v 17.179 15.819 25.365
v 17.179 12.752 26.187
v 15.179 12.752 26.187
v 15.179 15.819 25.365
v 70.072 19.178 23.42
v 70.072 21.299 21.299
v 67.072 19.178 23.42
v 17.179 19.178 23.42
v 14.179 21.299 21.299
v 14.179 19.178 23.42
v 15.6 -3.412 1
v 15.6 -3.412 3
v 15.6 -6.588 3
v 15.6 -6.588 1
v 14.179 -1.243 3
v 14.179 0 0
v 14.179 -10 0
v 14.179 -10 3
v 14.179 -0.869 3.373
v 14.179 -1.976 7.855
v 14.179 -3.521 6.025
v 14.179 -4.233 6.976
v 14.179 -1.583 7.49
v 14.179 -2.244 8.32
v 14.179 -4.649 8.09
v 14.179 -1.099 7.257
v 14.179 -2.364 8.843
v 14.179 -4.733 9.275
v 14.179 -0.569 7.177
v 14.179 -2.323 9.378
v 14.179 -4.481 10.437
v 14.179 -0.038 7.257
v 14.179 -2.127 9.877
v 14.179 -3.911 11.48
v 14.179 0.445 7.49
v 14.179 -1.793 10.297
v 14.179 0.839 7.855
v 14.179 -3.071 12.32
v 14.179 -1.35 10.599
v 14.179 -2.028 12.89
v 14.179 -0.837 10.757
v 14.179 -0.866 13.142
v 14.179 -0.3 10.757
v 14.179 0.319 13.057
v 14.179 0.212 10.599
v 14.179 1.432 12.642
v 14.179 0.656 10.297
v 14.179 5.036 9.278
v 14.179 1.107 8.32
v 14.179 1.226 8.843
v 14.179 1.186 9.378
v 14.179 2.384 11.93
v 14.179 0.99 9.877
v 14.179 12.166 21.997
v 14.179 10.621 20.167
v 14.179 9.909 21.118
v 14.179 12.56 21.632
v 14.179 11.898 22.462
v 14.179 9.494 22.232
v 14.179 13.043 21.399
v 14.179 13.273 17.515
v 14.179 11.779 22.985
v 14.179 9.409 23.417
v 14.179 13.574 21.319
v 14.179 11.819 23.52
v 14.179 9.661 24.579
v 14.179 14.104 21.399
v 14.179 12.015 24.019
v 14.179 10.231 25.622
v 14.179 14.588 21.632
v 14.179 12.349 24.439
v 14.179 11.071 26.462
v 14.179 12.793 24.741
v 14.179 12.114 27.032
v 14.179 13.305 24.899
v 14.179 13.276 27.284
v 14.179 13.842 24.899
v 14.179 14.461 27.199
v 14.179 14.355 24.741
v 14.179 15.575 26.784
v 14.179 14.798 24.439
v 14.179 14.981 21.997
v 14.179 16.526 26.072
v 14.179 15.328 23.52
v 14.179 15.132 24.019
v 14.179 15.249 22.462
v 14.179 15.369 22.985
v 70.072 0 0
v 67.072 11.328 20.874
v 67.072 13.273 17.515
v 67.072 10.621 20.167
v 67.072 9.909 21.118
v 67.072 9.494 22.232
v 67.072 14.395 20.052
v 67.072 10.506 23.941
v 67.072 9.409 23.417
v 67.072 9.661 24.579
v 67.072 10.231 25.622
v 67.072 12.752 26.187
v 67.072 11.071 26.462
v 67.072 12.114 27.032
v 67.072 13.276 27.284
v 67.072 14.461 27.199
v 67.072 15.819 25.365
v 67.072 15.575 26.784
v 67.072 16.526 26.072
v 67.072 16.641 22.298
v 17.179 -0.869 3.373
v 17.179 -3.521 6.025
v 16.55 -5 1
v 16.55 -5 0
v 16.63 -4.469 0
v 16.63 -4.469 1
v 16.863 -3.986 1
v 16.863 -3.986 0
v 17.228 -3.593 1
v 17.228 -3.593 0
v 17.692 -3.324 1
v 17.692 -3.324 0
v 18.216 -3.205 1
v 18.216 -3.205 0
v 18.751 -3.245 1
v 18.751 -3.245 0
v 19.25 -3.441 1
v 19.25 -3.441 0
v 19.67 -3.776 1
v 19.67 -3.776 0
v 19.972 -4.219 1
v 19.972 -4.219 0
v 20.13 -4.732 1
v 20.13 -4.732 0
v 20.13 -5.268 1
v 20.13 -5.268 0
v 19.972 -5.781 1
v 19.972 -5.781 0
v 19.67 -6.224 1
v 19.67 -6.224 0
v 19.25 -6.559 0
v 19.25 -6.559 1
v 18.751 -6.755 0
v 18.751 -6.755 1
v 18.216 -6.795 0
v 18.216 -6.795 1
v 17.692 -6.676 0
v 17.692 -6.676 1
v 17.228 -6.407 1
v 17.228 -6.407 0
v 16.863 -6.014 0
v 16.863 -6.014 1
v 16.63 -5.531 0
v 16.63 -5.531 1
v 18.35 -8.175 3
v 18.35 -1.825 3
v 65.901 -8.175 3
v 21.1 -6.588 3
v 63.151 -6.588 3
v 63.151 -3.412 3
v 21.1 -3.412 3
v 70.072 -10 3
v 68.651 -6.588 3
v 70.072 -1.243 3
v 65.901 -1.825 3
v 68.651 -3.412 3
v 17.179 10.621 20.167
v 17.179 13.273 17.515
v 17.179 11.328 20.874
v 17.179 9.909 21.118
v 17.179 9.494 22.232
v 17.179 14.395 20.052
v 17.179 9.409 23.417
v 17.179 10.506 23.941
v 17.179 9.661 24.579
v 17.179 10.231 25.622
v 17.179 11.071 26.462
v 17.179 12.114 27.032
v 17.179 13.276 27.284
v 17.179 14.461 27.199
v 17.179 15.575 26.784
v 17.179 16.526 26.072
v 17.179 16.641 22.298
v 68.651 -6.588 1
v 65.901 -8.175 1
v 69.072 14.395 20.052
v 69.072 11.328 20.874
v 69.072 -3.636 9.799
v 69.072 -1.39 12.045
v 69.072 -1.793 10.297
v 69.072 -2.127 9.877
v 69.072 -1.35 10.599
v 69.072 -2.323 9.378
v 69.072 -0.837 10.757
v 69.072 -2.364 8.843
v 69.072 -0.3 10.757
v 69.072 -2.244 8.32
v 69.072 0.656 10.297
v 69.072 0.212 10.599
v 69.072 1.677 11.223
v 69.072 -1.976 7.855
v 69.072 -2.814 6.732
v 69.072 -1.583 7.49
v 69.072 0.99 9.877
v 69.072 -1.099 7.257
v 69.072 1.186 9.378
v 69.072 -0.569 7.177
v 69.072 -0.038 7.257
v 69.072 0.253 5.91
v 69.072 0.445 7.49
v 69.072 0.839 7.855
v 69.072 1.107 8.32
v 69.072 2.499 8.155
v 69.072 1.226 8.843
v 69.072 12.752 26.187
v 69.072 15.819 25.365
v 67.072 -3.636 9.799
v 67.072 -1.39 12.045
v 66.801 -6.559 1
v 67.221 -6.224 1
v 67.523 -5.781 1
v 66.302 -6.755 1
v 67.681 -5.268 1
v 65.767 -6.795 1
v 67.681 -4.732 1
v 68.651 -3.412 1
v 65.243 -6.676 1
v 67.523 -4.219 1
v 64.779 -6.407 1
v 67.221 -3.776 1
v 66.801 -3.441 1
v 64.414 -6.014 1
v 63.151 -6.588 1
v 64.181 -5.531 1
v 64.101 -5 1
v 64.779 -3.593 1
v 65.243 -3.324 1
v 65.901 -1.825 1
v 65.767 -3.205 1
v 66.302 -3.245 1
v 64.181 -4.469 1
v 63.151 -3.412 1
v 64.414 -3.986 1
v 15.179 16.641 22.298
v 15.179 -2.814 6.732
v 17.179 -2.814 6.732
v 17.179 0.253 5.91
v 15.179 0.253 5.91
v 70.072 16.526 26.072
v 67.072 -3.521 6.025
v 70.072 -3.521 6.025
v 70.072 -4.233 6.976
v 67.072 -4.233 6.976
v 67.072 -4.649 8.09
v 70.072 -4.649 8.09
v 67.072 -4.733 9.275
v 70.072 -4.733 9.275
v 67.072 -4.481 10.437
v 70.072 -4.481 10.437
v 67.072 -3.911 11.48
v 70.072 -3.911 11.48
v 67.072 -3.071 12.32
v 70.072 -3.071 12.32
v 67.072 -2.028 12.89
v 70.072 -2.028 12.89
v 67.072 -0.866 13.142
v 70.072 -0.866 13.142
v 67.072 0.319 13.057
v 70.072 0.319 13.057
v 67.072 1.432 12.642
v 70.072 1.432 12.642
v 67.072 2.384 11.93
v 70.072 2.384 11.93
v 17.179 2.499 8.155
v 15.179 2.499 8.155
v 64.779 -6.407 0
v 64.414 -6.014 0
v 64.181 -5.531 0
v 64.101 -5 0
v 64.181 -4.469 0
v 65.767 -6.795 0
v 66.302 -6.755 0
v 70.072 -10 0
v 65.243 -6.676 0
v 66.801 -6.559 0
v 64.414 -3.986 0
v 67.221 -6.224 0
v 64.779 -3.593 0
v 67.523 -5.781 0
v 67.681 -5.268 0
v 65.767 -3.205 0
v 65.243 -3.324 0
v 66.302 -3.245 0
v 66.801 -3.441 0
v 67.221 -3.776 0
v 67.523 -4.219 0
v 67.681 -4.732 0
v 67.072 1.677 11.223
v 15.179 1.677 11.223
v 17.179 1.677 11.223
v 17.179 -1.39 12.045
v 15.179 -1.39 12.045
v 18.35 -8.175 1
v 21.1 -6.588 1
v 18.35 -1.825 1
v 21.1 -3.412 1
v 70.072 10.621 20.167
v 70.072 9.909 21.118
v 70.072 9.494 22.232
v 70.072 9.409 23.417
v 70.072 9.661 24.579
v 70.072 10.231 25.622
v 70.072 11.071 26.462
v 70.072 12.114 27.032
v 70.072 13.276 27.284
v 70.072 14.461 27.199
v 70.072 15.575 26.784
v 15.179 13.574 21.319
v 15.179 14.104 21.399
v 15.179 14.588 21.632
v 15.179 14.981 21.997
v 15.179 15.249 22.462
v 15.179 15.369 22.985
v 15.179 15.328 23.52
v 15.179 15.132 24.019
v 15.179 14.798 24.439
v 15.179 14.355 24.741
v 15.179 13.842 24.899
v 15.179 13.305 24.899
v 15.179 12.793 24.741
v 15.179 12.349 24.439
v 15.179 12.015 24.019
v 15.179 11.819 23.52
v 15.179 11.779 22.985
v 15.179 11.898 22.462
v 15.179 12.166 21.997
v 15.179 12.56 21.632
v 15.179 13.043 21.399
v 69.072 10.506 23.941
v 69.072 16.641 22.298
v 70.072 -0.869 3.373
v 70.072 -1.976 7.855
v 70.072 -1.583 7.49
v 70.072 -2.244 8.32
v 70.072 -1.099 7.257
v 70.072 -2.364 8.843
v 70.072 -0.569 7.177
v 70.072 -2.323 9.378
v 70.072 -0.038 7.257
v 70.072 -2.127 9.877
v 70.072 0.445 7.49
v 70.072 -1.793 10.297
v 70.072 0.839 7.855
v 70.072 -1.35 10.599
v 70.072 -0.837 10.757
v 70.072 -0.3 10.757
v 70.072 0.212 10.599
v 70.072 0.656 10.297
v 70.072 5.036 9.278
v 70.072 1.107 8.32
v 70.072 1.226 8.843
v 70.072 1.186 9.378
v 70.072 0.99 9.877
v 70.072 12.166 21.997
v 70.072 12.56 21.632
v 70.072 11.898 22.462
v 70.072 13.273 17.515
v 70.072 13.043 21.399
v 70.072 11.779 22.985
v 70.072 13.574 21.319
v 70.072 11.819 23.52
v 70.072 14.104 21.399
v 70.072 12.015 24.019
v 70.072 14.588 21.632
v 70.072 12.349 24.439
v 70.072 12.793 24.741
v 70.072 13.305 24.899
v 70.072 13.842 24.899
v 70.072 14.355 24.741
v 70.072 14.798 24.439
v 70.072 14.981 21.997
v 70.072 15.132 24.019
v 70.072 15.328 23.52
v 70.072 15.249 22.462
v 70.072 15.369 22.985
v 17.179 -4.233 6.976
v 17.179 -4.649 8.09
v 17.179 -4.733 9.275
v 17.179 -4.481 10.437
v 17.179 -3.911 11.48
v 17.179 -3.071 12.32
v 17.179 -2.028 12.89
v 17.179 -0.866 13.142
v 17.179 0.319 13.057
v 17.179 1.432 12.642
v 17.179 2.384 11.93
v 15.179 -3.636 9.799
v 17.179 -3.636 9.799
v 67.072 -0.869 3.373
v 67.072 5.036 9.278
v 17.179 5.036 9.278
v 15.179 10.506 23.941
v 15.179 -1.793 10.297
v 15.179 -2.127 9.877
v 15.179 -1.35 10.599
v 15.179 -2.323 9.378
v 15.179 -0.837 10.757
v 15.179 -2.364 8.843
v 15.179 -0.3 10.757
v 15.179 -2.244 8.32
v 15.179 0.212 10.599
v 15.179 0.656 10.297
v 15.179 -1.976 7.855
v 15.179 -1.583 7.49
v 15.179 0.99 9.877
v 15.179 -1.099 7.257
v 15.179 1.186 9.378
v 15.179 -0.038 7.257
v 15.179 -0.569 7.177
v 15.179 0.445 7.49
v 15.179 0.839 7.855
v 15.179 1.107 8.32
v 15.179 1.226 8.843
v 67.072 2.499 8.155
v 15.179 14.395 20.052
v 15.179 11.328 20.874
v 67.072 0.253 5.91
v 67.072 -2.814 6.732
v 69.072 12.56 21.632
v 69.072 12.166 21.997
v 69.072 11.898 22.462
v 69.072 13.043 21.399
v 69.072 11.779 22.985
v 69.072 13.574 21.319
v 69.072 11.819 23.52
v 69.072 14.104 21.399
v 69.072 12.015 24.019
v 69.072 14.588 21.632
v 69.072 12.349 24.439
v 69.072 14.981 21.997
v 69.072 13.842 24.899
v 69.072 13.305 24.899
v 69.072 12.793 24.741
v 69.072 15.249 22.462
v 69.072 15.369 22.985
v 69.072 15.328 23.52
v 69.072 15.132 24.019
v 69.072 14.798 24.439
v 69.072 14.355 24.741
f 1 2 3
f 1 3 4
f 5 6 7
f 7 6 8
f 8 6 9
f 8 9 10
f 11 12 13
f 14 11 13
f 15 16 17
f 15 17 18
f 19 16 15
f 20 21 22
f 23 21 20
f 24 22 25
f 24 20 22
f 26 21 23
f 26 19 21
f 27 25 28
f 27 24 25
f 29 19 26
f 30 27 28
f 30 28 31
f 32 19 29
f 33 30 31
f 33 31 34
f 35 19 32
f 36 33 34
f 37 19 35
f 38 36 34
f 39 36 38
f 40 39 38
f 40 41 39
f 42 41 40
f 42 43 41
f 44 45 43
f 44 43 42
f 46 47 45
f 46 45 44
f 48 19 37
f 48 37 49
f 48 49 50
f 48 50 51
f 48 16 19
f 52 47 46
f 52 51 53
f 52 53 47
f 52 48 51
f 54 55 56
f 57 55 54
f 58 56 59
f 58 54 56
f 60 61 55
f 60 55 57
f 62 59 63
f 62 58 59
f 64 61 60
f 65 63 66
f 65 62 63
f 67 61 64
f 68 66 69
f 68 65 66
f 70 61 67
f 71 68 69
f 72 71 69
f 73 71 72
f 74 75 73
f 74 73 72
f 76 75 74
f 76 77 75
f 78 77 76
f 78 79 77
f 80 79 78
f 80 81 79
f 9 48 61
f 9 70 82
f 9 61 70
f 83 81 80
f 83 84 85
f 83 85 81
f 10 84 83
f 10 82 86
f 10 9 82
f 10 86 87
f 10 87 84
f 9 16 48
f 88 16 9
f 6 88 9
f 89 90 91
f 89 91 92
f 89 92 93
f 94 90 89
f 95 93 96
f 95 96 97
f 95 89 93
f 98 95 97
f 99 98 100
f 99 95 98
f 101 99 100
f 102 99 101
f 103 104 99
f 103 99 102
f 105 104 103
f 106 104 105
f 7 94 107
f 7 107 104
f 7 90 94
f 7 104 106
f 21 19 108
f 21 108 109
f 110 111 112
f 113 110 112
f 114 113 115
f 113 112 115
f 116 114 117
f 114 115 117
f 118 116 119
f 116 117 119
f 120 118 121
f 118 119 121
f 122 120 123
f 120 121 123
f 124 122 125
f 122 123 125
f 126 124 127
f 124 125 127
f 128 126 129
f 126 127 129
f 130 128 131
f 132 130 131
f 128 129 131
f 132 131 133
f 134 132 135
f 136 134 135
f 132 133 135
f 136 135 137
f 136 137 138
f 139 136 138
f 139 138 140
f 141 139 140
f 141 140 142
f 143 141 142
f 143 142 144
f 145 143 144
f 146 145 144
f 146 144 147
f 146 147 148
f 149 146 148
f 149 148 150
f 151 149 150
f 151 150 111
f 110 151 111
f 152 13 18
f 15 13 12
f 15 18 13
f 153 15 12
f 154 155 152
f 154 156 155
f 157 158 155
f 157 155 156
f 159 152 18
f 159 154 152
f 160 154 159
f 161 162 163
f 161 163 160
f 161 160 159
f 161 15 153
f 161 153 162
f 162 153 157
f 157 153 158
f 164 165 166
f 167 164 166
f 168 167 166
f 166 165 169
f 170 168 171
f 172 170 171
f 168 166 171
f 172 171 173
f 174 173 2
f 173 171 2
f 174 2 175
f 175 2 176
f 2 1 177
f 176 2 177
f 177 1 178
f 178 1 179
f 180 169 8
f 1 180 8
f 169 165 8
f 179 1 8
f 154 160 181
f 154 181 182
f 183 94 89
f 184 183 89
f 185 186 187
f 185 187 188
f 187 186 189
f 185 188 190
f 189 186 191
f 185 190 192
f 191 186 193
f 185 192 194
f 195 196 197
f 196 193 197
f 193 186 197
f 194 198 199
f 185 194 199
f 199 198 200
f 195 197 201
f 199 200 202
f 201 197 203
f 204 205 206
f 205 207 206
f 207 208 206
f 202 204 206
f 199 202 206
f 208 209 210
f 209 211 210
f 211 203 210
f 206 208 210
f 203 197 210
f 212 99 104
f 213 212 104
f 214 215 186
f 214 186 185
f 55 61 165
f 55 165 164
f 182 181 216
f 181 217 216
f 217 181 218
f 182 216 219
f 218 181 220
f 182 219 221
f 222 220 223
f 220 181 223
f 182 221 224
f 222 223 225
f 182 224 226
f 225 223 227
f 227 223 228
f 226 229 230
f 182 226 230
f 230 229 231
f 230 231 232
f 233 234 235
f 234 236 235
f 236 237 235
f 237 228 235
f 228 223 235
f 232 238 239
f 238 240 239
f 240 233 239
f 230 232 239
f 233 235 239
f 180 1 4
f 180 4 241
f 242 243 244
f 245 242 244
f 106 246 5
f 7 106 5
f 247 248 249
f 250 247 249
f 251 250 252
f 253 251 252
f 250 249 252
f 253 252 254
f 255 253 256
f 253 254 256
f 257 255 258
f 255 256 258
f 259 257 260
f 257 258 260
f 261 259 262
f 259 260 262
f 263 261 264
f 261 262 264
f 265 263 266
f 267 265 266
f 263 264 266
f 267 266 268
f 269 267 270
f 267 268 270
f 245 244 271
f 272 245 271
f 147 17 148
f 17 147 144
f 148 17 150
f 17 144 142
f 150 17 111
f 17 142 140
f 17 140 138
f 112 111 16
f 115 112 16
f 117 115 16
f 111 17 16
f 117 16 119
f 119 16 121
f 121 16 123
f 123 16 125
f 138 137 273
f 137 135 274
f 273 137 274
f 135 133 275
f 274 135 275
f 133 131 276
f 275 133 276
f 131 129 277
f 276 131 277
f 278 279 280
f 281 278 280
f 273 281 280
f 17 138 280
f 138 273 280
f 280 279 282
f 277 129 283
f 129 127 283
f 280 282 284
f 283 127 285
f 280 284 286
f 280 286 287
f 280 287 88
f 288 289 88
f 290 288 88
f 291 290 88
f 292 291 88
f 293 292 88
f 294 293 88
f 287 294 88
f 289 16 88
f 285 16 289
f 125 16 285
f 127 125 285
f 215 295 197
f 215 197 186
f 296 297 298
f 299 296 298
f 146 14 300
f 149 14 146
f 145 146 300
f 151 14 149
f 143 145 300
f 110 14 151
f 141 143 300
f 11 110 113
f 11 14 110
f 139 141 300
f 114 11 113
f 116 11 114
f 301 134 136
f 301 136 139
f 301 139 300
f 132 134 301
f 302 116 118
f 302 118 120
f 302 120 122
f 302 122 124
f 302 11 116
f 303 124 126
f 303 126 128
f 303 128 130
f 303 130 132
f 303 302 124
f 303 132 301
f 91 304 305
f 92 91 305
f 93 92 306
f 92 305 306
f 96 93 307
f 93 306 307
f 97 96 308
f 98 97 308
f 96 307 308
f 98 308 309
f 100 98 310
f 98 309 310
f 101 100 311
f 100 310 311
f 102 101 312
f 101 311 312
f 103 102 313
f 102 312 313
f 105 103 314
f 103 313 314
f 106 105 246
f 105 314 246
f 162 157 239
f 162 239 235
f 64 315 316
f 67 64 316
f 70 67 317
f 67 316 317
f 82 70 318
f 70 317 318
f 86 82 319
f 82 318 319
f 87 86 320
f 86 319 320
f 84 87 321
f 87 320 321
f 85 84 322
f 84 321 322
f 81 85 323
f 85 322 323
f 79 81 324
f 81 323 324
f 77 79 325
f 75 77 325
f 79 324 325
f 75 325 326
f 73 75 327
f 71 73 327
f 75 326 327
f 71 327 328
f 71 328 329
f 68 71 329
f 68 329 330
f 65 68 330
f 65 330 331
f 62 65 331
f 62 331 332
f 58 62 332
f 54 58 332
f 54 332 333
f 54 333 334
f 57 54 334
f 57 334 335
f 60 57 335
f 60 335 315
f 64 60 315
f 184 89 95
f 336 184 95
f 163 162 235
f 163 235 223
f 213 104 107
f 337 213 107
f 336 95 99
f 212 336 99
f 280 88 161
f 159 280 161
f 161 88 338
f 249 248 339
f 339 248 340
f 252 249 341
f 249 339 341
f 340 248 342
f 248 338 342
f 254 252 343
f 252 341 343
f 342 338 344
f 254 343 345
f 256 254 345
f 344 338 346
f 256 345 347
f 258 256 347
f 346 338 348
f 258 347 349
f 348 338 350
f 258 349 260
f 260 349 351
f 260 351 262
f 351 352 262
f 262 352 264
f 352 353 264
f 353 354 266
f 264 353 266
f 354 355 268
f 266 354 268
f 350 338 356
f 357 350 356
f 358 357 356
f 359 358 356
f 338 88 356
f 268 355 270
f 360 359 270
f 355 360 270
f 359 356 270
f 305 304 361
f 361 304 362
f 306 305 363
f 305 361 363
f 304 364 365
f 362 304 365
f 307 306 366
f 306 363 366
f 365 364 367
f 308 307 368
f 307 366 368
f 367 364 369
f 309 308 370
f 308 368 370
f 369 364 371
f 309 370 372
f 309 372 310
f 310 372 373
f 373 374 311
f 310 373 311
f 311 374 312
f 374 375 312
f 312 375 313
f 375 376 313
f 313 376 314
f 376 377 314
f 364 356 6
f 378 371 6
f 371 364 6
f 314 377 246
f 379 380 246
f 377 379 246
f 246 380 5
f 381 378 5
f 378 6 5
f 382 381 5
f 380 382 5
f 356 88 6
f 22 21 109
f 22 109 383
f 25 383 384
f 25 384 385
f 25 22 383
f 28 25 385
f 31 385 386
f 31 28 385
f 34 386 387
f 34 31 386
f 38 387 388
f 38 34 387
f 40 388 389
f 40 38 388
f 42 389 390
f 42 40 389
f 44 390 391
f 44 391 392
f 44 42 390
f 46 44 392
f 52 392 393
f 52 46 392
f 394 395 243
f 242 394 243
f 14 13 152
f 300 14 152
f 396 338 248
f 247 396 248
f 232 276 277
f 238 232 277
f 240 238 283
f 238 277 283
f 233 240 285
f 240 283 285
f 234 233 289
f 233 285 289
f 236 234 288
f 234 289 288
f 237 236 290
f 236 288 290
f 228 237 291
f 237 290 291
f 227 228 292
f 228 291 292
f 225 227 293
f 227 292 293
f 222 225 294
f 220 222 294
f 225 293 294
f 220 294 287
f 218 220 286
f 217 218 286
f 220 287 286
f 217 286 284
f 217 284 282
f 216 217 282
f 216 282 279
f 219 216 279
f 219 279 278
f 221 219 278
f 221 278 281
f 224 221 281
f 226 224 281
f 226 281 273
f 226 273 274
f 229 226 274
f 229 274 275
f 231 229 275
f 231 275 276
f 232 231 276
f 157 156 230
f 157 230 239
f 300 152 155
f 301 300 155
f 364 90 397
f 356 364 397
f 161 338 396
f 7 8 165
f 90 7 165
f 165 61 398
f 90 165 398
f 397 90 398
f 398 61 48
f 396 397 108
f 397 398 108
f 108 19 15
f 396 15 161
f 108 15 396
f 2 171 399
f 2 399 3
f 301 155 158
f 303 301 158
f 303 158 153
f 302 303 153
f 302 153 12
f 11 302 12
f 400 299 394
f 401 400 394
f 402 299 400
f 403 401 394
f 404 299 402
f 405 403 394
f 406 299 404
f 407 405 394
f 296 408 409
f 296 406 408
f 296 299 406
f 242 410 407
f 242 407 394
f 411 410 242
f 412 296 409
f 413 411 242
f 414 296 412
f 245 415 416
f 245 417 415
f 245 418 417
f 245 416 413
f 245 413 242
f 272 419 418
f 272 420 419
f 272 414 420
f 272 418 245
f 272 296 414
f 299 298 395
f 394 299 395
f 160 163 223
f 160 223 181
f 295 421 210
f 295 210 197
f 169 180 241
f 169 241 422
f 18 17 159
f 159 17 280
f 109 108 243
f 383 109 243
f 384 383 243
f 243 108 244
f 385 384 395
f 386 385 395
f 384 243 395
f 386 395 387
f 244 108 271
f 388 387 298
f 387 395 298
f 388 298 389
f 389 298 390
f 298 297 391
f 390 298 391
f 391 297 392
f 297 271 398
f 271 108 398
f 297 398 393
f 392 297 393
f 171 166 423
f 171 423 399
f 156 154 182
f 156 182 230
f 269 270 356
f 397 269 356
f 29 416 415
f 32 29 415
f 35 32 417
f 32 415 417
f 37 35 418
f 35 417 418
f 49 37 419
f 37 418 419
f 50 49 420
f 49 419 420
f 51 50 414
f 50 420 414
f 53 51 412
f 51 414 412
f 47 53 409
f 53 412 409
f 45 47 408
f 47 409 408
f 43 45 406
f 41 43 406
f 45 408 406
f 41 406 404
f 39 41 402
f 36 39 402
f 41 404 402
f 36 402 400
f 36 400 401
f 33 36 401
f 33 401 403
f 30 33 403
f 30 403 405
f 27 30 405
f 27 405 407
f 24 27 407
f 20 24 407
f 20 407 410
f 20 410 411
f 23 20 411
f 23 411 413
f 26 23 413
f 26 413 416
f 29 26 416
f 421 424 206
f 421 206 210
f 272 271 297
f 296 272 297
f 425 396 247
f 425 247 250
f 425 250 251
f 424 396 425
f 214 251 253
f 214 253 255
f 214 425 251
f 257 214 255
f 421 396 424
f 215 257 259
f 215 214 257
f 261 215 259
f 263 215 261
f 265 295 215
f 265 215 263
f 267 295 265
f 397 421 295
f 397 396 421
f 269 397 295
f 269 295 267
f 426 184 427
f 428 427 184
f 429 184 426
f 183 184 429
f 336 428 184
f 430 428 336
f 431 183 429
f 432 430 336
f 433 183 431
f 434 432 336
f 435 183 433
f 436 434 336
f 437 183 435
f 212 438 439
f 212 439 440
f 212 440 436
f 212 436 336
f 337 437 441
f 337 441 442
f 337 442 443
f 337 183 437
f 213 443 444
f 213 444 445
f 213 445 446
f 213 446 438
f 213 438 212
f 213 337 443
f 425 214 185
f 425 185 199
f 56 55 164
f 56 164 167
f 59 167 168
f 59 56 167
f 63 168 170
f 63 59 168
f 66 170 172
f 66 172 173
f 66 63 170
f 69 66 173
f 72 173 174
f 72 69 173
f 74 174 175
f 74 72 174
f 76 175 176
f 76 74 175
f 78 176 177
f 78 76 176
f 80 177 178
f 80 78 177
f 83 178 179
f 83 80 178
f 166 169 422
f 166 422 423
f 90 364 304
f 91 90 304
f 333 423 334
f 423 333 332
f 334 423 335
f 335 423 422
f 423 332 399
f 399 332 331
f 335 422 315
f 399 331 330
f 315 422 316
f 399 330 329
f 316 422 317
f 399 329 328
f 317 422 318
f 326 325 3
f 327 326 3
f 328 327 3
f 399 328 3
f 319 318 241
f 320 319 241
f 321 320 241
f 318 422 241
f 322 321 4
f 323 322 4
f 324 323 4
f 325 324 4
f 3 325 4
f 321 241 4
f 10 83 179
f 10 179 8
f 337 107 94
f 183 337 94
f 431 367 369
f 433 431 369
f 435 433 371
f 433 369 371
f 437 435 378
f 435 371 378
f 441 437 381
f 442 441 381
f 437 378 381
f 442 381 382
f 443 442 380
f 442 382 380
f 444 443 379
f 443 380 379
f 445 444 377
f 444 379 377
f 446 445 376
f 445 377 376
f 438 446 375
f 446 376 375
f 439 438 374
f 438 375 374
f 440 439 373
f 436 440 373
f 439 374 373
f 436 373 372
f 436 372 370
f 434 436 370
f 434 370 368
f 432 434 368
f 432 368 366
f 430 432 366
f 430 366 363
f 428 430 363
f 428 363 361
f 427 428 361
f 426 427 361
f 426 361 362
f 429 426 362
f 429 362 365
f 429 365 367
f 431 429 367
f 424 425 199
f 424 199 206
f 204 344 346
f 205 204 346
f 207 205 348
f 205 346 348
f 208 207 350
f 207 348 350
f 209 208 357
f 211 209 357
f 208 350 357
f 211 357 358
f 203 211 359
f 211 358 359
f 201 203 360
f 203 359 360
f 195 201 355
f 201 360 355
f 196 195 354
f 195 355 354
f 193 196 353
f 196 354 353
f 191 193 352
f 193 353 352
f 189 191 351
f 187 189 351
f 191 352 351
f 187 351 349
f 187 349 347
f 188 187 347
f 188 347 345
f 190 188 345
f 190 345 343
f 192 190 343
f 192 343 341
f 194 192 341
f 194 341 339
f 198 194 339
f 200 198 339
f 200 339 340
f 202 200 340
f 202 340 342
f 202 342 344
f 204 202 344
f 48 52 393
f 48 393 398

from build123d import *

# Parameters (mm, degrees)
SKETCH1_W            = 55.892639293
SKETCH1_H            = 10
BOSS_EXTRUDE1_DEPTH  = 3
CUT_EXTRUDE1_DEPTH   = 2
M3_CLEARANCE_HOLE1_D = 3.6
BOSS_EXTRUDE2_DEPTH  = 55.892639293
BOSS_EXTRUDE3_DEPTH  = 3
M3_CLEARANCE_HOLE2_D = 3.6
CUT_EXTRUDE2_START   = -3
CUT_EXTRUDE2_DEPTH   = 2
CUT_EXTRUDE3_START   = -52.892639
CUT_EXTRUDE3_DEPTH   = 2


with BuildPart() as part:
    # Sketch1 → Boss-Extrude1 (new body)
    with BuildSketch(Plane.XY):
        with Locations((42.125546196, -5)):
            Rectangle(SKETCH1_W, SKETCH1_H)
    extrude(amount=BOSS_EXTRUDE1_DEPTH)

    # Sketch2 → Cut-Extrude1 (cut)
    with BuildSketch(Plane.XY.offset(3)):
        Polygon((65.90105946, -8.175426481), (63.15105946, -6.58771324), (63.15105946, -3.41228676), (65.90105946, -1.824573519), (68.65105946, -3.41228676), (68.65105946, -6.58771324), align=None)
        Polygon((21.100032933, -6.58771324), (21.100032933, -3.41228676), (18.350032933, -1.824573519), (15.600032933, -3.41228676), (15.600032933, -6.58771324), (18.350032933, -8.175426481), align=None)
    extrude(amount=-CUT_EXTRUDE1_DEPTH, mode=Mode.SUBTRACT)

    # M3 Clearance Hole1 (through all)
    with Locations(Plane.XY.offset(3)):
        with Locations((18.350032933, -5), (65.90105946, -5)):
            Hole(M3_CLEARANCE_HOLE1_D / 2)

    # Sketch5 → Boss-Extrude2 (add)
    with BuildSketch(Plane.ZY.offset(-14.17922655)):
        Polygon((0, 0), (21.298989873, 21.298989873), (23.420310217, 19.17766953), (3, -1.242640687), (3, 0), align=None)
    extrude(amount=-BOSS_EXTRUDE2_DEPTH)

    # Sketch6 → Boss-Extrude3 (add)
    # profile 1 of 4: a face of its own
    with BuildSketch(Plane.ZY.offset(-14.17922655)):
        with BuildLine():
            Line((11.929825022, 2.383883477), (9.278174593, 5.035533906))
            Line((9.278174593, 5.035533906), (3.373229836, -0.869410851))
            Line((3.373229836, -0.869410851), (6.024880265, -3.521061281))
            ThreePointArc((6.024880265, -3.521061281), (11.929825022, -3.521061281), (11.929825022, 2.383883477))
        make_face()
        Polygon((6.731987046, -2.8139545), (5.910126197, 0.253271947), (8.155491794, 2.498637545), (11.222718241, 1.676776695), (12.044579091, -1.390449752), (9.799213493, -3.635815349), align=None, mode=Mode.SUBTRACT)
    # profile 2 of 4: a face of its own
    with BuildSketch(Plane.ZY.offset(-14.17922655)):
        Polygon((8.155491794, 2.498637545), (11.222718241, 1.676776695), (12.044579091, -1.390449752), (9.799213493, -3.635815349), (6.731987046, -2.8139545), (5.910126197, 0.253271947), align=None)
    # profile 3 of 4: a face of its own
    with BuildSketch(Plane.ZY.offset(-14.17922655)):
        with BuildLine():
            Line((26.071960646, 16.5260191), (23.420310217, 19.17766953))
            Line((23.420310217, 19.17766953), (17.515365459, 13.272724772))
            Line((17.515365459, 13.272724772), (20.167015889, 10.621074343))
            ThreePointArc((20.167015889, 10.621074343), (26.071960646, 10.621074343), (26.071960646, 16.5260191))
        make_face()
        Polygon((23.941349117, 10.506320274), (20.87412267, 11.328181124), (20.05226182, 14.395407571), (22.297627418, 16.640773169), (25.364853865, 15.818912319), (26.186714714, 12.751685872), align=None, mode=Mode.SUBTRACT)
    # profile 4 of 4: a face of its own
    with BuildSketch(Plane.ZY.offset(-14.17922655)):
        Polygon((22.297627418, 16.640773169), (20.05226182, 14.395407571), (20.87412267, 11.328181124), (23.941349117, 10.506320274), (26.186714714, 12.751685872), (25.364853865, 15.818912319), align=None)
    boss_extrude3 = extrude(amount=-BOSS_EXTRUDE3_DEPTH)

    # Mirror1: Boss-Extrude3 across plane
    add(boss_extrude3.mirror(Plane.ZY.offset(-42.125546197)))

    # M3 Clearance Hole2 (through all)
    with Locations(Plane.ZY.offset(-14.17922655)):
        with Locations((8.977352644, -0.568588902), (23.119488267, 13.573546722)):
            Hole(M3_CLEARANCE_HOLE2_D / 2)

    # Sketch6<3> → Cut-Extrude2 (cut)
    with BuildSketch(Plane.ZY.offset(-14.17922655).offset(CUT_EXTRUDE2_START)):
        Polygon((8.155491794, 2.498637545), (11.222718241, 1.676776695), (12.044579091, -1.390449752), (9.799213493, -3.635815349), (6.731987046, -2.8139545), (5.910126197, 0.253271947), align=None)
        Polygon((22.297627418, 16.640773169), (20.05226182, 14.395407571), (20.87412267, 11.328181124), (23.941349117, 10.506320274), (26.186714714, 12.751685872), (25.364853865, 15.818912319), align=None)
    extrude(amount=CUT_EXTRUDE2_DEPTH, mode=Mode.SUBTRACT)

    # Sketch6<4> → Cut-Extrude3 (cut)
    with BuildSketch(Plane.ZY.offset(-14.17922655).offset(CUT_EXTRUDE3_START)):
        Polygon((22.297627418, 16.640773169), (20.05226182, 14.395407571), (20.87412267, 11.328181124), (23.941349117, 10.506320274), (26.186714714, 12.751685872), (25.364853865, 15.818912319), align=None)
        Polygon((8.155491794, 2.498637545), (11.222718241, 1.676776695), (12.044579091, -1.390449752), (9.799213493, -3.635815349), (6.731987046, -2.8139545), (5.910126197, 0.253271947), align=None)
    extrude(amount=-CUT_EXTRUDE3_DEPTH, mode=Mode.SUBTRACT)


solid = part.part
